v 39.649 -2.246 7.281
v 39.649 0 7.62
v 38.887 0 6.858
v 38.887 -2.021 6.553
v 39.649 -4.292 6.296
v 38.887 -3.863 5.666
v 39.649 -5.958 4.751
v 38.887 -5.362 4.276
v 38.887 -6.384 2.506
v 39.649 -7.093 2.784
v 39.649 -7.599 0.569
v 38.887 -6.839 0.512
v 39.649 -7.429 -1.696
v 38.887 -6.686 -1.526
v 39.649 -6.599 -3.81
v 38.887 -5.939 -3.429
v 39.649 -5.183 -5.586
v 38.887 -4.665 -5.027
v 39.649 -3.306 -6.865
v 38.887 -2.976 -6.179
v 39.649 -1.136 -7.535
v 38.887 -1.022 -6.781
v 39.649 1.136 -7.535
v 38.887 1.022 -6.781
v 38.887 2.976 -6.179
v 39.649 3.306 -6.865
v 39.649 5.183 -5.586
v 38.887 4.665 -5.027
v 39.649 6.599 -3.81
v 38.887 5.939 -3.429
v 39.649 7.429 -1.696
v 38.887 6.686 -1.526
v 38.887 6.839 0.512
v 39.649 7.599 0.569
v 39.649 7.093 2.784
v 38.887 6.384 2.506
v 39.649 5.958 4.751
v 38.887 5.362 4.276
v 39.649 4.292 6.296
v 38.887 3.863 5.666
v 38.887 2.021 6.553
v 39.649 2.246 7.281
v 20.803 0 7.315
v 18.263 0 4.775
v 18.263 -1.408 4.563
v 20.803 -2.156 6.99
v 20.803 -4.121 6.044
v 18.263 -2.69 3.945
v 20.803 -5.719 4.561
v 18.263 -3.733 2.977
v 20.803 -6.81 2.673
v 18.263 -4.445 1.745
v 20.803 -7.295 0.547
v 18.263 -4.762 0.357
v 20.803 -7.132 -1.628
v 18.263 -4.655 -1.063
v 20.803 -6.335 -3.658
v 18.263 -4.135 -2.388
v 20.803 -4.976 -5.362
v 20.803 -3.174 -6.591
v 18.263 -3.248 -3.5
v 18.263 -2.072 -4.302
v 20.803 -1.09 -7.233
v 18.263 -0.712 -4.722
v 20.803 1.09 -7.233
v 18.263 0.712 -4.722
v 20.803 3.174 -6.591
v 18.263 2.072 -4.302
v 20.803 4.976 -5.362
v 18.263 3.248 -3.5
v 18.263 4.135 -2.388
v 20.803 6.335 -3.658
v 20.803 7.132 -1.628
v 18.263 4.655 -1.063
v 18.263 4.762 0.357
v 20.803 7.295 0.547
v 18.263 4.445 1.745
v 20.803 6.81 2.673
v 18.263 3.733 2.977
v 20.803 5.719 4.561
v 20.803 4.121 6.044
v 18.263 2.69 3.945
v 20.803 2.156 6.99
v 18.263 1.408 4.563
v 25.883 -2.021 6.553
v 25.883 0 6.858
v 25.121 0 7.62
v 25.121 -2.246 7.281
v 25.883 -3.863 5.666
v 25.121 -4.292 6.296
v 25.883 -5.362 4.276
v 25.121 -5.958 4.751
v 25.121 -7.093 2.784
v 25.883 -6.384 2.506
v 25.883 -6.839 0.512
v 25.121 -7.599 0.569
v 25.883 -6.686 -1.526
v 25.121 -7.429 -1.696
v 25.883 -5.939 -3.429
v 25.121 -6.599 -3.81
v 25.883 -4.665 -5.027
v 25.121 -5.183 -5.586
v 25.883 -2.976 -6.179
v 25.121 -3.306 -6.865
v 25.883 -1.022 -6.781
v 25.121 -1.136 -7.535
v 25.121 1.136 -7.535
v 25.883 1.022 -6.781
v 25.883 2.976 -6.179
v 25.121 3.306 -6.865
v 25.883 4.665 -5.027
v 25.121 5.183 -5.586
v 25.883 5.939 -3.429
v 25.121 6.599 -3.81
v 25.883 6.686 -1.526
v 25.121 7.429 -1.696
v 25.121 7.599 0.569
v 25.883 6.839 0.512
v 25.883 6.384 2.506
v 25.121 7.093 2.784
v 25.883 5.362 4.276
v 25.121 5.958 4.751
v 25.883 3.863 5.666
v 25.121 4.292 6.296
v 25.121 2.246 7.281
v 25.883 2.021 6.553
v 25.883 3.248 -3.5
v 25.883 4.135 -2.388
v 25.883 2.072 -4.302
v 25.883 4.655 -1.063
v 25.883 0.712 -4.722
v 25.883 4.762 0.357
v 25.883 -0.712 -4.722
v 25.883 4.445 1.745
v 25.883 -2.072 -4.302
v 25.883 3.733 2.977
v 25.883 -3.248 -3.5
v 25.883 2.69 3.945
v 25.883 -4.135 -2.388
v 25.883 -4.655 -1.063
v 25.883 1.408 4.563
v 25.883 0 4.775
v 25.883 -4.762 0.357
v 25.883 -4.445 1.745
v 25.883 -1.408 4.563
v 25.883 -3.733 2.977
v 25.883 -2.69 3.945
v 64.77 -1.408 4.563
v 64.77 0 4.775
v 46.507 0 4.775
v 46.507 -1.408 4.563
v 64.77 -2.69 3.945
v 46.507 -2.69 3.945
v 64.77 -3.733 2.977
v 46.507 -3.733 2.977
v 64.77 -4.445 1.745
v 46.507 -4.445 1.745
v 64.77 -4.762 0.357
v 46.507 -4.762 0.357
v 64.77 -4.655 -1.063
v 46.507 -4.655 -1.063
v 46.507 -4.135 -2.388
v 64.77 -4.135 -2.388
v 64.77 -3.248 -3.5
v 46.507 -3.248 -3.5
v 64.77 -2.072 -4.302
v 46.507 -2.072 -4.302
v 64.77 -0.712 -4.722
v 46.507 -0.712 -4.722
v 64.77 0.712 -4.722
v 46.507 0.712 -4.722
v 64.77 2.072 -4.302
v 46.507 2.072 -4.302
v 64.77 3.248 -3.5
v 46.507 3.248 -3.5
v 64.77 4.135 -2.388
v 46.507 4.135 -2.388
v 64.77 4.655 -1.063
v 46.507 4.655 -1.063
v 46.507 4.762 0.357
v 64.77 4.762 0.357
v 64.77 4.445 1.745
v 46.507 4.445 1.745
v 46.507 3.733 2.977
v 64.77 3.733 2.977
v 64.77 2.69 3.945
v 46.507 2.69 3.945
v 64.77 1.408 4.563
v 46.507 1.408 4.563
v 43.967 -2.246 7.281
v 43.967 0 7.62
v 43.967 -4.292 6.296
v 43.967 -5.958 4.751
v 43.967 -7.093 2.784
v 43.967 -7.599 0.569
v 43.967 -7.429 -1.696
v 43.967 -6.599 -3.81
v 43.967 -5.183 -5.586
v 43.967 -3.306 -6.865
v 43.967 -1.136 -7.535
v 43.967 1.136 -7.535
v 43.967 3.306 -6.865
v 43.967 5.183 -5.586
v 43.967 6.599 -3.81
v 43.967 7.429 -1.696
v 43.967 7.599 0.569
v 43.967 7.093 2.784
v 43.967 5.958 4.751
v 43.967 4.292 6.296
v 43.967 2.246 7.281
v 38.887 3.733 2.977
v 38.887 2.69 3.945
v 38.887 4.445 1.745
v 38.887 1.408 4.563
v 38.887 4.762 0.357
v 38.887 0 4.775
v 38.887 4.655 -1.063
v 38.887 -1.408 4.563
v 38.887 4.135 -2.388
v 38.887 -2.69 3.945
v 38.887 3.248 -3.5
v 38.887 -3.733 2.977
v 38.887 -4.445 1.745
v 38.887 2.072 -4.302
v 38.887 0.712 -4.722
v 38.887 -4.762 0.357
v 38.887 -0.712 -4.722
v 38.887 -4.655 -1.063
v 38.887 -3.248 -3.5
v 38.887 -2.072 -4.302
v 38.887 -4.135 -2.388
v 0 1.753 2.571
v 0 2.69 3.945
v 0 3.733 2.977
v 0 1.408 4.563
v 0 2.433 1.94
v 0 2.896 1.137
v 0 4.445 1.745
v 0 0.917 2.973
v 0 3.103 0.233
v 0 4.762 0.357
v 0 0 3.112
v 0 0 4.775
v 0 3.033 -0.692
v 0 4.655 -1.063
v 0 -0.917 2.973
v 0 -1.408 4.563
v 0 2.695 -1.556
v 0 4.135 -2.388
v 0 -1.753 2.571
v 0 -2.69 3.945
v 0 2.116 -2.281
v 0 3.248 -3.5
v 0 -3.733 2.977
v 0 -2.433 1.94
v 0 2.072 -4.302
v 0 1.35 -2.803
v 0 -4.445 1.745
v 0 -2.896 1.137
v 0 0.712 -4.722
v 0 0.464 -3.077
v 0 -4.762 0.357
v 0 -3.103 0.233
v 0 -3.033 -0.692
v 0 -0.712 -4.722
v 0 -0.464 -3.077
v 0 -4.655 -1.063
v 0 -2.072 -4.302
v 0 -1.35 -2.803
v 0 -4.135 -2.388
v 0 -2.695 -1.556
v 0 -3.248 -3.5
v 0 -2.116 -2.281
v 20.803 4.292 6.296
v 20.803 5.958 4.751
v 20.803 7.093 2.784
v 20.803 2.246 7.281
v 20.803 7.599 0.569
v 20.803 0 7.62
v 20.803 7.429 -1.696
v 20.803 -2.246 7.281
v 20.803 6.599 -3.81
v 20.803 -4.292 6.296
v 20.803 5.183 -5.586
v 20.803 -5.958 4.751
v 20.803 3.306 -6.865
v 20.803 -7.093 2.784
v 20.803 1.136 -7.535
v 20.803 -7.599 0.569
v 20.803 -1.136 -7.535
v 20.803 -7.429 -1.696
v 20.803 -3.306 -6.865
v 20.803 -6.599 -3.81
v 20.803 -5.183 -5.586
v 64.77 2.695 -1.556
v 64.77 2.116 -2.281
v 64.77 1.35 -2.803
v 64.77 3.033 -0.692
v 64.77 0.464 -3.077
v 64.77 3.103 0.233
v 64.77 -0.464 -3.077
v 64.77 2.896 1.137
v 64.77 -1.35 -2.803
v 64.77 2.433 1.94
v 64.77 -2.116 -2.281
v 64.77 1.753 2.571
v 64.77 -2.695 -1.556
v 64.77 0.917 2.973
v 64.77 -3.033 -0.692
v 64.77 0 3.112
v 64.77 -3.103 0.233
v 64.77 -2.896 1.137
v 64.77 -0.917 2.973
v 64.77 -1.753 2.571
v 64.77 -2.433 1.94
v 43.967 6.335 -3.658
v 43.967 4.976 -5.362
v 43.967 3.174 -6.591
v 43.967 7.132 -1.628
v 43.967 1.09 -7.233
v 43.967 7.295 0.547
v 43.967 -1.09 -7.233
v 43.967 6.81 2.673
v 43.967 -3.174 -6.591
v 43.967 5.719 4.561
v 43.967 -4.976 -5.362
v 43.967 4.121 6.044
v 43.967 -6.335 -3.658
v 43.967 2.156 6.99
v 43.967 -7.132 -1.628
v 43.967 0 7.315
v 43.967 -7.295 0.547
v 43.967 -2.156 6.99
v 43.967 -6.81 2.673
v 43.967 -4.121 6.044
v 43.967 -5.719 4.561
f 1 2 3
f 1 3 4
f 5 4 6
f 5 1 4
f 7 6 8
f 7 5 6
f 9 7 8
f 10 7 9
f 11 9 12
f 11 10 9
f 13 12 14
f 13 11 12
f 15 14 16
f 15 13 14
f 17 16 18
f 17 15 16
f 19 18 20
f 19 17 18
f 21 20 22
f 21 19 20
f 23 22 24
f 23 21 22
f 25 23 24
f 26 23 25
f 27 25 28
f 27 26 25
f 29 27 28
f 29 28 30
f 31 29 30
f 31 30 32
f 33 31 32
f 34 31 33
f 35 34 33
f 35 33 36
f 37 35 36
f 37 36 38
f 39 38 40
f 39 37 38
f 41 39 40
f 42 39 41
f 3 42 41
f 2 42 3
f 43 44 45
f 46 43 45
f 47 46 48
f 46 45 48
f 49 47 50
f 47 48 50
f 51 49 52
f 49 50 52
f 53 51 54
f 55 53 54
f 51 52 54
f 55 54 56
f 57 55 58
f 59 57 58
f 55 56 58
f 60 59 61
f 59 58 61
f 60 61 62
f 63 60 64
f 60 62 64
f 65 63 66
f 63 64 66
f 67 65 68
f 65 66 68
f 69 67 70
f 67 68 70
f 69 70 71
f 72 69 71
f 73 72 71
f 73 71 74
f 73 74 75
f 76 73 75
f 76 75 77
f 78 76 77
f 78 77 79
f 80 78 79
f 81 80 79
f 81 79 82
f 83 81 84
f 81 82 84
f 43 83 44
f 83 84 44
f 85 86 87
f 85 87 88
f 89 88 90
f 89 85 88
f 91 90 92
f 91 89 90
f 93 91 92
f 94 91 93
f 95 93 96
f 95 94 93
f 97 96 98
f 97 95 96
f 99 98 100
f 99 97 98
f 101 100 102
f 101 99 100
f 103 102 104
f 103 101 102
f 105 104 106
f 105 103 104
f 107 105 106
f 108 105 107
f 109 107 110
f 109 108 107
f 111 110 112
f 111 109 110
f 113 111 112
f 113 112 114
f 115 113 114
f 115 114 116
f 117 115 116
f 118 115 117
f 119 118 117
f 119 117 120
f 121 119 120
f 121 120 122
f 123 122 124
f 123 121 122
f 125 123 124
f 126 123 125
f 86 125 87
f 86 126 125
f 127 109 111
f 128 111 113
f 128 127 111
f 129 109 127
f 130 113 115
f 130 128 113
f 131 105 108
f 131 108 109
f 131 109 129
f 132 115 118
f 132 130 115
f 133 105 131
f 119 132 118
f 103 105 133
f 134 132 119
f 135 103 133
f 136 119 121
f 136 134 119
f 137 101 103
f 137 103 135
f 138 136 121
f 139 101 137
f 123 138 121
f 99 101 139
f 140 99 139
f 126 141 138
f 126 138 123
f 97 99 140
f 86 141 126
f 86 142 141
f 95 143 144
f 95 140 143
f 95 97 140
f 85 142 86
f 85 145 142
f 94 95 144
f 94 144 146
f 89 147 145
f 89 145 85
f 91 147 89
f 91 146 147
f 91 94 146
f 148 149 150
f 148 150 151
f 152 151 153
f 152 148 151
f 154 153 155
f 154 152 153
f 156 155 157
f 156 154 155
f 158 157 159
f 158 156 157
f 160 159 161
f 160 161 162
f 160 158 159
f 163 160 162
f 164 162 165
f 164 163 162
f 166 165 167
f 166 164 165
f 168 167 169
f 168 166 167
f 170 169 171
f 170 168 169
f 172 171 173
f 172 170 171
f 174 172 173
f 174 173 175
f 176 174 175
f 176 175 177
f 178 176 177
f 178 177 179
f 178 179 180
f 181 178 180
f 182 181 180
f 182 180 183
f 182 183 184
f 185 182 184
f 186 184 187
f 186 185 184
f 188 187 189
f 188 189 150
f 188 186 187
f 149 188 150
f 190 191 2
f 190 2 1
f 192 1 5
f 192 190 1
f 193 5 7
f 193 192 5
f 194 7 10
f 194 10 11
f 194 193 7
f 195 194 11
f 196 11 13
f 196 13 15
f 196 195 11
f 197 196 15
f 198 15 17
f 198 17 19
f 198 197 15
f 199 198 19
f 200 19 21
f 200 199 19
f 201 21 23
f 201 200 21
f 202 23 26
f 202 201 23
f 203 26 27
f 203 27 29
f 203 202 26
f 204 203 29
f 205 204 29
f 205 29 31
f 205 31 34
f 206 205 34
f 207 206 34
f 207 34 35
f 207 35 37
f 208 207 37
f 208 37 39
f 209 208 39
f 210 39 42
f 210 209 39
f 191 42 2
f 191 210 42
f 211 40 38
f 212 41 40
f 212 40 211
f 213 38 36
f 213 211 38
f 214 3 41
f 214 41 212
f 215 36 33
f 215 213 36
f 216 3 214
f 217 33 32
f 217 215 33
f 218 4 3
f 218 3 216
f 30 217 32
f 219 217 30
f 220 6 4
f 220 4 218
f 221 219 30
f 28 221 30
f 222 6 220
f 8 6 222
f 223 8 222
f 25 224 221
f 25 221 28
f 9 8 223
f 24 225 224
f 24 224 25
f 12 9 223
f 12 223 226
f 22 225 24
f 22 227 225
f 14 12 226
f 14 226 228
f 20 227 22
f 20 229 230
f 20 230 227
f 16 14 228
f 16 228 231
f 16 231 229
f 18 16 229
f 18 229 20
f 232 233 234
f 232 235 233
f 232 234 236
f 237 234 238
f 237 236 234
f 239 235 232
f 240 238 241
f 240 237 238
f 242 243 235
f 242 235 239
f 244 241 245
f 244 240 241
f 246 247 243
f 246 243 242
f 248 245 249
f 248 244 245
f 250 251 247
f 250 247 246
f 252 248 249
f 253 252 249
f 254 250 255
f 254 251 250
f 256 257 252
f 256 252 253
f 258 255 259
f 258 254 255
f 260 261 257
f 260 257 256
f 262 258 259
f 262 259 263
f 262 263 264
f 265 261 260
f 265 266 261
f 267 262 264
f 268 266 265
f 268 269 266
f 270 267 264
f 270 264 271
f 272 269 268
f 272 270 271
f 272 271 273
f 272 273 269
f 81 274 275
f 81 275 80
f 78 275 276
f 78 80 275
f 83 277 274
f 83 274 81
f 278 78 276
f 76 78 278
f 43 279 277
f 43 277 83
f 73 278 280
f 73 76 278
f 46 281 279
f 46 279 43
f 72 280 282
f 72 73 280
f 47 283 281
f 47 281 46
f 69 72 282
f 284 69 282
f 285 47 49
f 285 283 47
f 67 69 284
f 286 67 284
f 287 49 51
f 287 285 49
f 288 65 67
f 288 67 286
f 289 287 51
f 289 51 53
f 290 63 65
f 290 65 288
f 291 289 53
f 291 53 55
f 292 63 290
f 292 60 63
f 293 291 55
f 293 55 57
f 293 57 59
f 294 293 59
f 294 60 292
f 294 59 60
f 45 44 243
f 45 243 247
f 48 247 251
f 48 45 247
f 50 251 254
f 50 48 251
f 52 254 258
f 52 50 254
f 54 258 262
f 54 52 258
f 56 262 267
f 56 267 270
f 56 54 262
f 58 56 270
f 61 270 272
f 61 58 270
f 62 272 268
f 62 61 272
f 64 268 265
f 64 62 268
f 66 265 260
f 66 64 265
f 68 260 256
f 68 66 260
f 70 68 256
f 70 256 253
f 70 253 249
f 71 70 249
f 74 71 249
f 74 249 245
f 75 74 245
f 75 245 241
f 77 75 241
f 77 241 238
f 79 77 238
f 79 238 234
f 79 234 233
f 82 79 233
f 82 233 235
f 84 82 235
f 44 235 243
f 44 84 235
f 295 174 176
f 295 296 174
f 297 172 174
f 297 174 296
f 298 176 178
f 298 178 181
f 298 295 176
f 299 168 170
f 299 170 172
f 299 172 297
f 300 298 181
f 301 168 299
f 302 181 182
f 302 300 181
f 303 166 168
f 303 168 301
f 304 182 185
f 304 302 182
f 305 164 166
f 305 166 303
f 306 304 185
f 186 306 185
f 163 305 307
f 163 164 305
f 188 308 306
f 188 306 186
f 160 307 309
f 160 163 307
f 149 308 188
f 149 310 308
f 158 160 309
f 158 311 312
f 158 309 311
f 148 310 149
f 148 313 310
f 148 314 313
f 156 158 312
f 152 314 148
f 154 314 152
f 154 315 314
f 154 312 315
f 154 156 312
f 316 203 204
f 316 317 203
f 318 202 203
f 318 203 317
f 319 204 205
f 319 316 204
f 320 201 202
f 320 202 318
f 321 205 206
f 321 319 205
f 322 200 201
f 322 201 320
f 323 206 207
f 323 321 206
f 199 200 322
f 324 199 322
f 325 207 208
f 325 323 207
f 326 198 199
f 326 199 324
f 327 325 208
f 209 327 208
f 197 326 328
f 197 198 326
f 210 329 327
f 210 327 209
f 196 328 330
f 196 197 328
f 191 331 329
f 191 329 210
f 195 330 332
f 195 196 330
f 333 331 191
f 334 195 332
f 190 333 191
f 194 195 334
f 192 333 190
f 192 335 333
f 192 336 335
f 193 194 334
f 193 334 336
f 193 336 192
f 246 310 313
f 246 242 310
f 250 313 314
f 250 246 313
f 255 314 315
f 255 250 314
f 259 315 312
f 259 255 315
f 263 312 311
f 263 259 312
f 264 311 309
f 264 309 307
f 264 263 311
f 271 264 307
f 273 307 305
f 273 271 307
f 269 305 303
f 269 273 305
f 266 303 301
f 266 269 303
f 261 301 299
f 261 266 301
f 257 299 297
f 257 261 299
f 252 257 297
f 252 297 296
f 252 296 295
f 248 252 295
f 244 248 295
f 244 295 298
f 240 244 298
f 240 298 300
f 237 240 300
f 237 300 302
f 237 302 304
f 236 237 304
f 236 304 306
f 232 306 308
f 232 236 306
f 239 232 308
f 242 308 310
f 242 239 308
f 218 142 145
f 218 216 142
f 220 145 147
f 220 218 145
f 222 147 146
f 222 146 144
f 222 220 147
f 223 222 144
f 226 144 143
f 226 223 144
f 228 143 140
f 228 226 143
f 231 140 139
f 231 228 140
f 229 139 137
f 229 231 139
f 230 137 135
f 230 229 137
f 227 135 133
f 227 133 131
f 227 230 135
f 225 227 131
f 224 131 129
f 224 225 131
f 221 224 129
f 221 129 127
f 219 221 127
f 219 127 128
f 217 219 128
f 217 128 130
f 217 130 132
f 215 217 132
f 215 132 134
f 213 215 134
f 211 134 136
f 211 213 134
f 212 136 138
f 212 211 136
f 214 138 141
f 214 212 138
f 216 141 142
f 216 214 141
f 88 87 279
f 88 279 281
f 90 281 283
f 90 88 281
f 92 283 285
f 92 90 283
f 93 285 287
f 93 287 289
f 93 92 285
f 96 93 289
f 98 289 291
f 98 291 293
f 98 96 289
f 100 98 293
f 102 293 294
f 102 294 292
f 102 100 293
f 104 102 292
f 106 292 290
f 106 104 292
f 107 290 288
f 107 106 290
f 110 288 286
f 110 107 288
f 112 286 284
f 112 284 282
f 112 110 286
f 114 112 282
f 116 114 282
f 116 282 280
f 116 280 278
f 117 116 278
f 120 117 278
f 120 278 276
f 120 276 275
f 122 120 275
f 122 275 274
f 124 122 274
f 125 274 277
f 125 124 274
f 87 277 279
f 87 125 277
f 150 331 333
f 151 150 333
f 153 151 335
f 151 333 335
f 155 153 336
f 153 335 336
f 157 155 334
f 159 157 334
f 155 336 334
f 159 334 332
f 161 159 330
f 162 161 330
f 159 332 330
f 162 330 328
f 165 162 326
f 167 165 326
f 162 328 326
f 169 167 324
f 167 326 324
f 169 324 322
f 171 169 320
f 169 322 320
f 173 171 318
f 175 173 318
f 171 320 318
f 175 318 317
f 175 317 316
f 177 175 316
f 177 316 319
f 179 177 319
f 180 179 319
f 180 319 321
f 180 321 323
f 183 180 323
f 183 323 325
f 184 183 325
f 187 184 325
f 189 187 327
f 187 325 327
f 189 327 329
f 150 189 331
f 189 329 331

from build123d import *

# Parameters (mm, degrees)
CHAMFER1_SIZE = 0.762
CHAMFER2_SIZE = 2.54


with BuildPart() as part:
    # Sketch1 → Revolve1 (revolve)
    with BuildSketch(Plane.XY, mode=Mode.PRIVATE) as revolve1_sk:
        Polygon((0, 3.1115), (0, 4.7752), (20.8026, 4.7752), (20.8026, 7.62), (25.8826, 7.62), (25.8826, 4.7752), (38.8874, 4.7752), (38.8874, 7.62), (43.9674, 7.62), (43.9674, 4.7752), (64.77, 4.7752), (64.77, 3.1115), align=None)
    revolve(revolve1_sk.sketch.rotate(Axis((0, 0, 0), (1, 0, 0)), 90), axis=Axis((0, 0, 0), (1, 0, 0)))

    # Chamfer1
    chamfer1_edges = [part.edges().sort_by_distance(p)[0] for p in [
        (38.8874, 0, -7.62),
        (25.8826, 0, -7.62),
    ]]
    chamfer(chamfer1_edges, length=CHAMFER1_SIZE)

    # Chamfer2
    chamfer2_edges = [part.edges().sort_by_distance(p)[0] for p in [
        (43.9674, 0, -4.7752),
        (20.8026, 0, -4.7752),
    ]]
    chamfer(chamfer2_edges, length=CHAMFER2_SIZE)


solid = part.part
